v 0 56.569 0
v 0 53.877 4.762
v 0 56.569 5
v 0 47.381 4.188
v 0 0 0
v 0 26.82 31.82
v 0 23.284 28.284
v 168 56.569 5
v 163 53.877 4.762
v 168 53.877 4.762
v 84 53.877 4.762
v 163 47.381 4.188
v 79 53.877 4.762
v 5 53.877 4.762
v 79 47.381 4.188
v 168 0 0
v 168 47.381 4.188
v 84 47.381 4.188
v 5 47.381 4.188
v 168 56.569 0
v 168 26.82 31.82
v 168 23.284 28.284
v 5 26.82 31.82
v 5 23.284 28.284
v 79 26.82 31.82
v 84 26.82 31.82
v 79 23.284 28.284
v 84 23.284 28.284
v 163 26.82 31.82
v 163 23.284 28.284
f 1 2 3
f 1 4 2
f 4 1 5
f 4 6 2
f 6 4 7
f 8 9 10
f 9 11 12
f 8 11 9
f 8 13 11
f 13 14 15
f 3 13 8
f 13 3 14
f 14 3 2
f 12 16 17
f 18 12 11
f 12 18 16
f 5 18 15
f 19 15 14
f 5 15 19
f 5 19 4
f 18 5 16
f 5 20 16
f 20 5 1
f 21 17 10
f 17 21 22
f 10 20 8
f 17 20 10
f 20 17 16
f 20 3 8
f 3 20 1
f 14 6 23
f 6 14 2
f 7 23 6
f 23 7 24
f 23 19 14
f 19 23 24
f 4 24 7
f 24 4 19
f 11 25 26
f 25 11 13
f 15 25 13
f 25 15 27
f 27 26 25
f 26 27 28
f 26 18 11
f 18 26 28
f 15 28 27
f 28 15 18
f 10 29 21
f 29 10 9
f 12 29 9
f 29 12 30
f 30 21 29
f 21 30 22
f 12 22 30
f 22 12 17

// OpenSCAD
/*
    Splash Guard
*/
splash_guard_depth = 40;  // mm
splash_guard_width = 168;  // mm

h = 40;
b = splash_guard_depth;
theta = atan(h / b);  // degrees

module plate_rear_foot(width) {
    rotate([theta, 0, 0]) {
        linear_extrude(h) square(width, center=false);
    }
}

module splash_plate(width, depth) {
    rotate([0, 90, 0])
        linear_extrude(width)
            polygon([
                [0, 0],
                [0, depth],
                [-5, depth]
            ]);
}

module splash_guard(width, depth) {
    foot_width = 5;
    plate_depth = depth / cos(theta);
    splash_plate(width, plate_depth);
    translate([0, plate_depth - foot_width]) 
        plate_rear_foot(foot_width);
    translate([width / 2 - foot_width, plate_depth - foot_width])
        plate_rear_foot(foot_width);
    translate([width - foot_width, plate_depth - foot_width])
        plate_rear_foot(foot_width);
}

splash_guard(splash_guard_width, splash_guard_depth);
